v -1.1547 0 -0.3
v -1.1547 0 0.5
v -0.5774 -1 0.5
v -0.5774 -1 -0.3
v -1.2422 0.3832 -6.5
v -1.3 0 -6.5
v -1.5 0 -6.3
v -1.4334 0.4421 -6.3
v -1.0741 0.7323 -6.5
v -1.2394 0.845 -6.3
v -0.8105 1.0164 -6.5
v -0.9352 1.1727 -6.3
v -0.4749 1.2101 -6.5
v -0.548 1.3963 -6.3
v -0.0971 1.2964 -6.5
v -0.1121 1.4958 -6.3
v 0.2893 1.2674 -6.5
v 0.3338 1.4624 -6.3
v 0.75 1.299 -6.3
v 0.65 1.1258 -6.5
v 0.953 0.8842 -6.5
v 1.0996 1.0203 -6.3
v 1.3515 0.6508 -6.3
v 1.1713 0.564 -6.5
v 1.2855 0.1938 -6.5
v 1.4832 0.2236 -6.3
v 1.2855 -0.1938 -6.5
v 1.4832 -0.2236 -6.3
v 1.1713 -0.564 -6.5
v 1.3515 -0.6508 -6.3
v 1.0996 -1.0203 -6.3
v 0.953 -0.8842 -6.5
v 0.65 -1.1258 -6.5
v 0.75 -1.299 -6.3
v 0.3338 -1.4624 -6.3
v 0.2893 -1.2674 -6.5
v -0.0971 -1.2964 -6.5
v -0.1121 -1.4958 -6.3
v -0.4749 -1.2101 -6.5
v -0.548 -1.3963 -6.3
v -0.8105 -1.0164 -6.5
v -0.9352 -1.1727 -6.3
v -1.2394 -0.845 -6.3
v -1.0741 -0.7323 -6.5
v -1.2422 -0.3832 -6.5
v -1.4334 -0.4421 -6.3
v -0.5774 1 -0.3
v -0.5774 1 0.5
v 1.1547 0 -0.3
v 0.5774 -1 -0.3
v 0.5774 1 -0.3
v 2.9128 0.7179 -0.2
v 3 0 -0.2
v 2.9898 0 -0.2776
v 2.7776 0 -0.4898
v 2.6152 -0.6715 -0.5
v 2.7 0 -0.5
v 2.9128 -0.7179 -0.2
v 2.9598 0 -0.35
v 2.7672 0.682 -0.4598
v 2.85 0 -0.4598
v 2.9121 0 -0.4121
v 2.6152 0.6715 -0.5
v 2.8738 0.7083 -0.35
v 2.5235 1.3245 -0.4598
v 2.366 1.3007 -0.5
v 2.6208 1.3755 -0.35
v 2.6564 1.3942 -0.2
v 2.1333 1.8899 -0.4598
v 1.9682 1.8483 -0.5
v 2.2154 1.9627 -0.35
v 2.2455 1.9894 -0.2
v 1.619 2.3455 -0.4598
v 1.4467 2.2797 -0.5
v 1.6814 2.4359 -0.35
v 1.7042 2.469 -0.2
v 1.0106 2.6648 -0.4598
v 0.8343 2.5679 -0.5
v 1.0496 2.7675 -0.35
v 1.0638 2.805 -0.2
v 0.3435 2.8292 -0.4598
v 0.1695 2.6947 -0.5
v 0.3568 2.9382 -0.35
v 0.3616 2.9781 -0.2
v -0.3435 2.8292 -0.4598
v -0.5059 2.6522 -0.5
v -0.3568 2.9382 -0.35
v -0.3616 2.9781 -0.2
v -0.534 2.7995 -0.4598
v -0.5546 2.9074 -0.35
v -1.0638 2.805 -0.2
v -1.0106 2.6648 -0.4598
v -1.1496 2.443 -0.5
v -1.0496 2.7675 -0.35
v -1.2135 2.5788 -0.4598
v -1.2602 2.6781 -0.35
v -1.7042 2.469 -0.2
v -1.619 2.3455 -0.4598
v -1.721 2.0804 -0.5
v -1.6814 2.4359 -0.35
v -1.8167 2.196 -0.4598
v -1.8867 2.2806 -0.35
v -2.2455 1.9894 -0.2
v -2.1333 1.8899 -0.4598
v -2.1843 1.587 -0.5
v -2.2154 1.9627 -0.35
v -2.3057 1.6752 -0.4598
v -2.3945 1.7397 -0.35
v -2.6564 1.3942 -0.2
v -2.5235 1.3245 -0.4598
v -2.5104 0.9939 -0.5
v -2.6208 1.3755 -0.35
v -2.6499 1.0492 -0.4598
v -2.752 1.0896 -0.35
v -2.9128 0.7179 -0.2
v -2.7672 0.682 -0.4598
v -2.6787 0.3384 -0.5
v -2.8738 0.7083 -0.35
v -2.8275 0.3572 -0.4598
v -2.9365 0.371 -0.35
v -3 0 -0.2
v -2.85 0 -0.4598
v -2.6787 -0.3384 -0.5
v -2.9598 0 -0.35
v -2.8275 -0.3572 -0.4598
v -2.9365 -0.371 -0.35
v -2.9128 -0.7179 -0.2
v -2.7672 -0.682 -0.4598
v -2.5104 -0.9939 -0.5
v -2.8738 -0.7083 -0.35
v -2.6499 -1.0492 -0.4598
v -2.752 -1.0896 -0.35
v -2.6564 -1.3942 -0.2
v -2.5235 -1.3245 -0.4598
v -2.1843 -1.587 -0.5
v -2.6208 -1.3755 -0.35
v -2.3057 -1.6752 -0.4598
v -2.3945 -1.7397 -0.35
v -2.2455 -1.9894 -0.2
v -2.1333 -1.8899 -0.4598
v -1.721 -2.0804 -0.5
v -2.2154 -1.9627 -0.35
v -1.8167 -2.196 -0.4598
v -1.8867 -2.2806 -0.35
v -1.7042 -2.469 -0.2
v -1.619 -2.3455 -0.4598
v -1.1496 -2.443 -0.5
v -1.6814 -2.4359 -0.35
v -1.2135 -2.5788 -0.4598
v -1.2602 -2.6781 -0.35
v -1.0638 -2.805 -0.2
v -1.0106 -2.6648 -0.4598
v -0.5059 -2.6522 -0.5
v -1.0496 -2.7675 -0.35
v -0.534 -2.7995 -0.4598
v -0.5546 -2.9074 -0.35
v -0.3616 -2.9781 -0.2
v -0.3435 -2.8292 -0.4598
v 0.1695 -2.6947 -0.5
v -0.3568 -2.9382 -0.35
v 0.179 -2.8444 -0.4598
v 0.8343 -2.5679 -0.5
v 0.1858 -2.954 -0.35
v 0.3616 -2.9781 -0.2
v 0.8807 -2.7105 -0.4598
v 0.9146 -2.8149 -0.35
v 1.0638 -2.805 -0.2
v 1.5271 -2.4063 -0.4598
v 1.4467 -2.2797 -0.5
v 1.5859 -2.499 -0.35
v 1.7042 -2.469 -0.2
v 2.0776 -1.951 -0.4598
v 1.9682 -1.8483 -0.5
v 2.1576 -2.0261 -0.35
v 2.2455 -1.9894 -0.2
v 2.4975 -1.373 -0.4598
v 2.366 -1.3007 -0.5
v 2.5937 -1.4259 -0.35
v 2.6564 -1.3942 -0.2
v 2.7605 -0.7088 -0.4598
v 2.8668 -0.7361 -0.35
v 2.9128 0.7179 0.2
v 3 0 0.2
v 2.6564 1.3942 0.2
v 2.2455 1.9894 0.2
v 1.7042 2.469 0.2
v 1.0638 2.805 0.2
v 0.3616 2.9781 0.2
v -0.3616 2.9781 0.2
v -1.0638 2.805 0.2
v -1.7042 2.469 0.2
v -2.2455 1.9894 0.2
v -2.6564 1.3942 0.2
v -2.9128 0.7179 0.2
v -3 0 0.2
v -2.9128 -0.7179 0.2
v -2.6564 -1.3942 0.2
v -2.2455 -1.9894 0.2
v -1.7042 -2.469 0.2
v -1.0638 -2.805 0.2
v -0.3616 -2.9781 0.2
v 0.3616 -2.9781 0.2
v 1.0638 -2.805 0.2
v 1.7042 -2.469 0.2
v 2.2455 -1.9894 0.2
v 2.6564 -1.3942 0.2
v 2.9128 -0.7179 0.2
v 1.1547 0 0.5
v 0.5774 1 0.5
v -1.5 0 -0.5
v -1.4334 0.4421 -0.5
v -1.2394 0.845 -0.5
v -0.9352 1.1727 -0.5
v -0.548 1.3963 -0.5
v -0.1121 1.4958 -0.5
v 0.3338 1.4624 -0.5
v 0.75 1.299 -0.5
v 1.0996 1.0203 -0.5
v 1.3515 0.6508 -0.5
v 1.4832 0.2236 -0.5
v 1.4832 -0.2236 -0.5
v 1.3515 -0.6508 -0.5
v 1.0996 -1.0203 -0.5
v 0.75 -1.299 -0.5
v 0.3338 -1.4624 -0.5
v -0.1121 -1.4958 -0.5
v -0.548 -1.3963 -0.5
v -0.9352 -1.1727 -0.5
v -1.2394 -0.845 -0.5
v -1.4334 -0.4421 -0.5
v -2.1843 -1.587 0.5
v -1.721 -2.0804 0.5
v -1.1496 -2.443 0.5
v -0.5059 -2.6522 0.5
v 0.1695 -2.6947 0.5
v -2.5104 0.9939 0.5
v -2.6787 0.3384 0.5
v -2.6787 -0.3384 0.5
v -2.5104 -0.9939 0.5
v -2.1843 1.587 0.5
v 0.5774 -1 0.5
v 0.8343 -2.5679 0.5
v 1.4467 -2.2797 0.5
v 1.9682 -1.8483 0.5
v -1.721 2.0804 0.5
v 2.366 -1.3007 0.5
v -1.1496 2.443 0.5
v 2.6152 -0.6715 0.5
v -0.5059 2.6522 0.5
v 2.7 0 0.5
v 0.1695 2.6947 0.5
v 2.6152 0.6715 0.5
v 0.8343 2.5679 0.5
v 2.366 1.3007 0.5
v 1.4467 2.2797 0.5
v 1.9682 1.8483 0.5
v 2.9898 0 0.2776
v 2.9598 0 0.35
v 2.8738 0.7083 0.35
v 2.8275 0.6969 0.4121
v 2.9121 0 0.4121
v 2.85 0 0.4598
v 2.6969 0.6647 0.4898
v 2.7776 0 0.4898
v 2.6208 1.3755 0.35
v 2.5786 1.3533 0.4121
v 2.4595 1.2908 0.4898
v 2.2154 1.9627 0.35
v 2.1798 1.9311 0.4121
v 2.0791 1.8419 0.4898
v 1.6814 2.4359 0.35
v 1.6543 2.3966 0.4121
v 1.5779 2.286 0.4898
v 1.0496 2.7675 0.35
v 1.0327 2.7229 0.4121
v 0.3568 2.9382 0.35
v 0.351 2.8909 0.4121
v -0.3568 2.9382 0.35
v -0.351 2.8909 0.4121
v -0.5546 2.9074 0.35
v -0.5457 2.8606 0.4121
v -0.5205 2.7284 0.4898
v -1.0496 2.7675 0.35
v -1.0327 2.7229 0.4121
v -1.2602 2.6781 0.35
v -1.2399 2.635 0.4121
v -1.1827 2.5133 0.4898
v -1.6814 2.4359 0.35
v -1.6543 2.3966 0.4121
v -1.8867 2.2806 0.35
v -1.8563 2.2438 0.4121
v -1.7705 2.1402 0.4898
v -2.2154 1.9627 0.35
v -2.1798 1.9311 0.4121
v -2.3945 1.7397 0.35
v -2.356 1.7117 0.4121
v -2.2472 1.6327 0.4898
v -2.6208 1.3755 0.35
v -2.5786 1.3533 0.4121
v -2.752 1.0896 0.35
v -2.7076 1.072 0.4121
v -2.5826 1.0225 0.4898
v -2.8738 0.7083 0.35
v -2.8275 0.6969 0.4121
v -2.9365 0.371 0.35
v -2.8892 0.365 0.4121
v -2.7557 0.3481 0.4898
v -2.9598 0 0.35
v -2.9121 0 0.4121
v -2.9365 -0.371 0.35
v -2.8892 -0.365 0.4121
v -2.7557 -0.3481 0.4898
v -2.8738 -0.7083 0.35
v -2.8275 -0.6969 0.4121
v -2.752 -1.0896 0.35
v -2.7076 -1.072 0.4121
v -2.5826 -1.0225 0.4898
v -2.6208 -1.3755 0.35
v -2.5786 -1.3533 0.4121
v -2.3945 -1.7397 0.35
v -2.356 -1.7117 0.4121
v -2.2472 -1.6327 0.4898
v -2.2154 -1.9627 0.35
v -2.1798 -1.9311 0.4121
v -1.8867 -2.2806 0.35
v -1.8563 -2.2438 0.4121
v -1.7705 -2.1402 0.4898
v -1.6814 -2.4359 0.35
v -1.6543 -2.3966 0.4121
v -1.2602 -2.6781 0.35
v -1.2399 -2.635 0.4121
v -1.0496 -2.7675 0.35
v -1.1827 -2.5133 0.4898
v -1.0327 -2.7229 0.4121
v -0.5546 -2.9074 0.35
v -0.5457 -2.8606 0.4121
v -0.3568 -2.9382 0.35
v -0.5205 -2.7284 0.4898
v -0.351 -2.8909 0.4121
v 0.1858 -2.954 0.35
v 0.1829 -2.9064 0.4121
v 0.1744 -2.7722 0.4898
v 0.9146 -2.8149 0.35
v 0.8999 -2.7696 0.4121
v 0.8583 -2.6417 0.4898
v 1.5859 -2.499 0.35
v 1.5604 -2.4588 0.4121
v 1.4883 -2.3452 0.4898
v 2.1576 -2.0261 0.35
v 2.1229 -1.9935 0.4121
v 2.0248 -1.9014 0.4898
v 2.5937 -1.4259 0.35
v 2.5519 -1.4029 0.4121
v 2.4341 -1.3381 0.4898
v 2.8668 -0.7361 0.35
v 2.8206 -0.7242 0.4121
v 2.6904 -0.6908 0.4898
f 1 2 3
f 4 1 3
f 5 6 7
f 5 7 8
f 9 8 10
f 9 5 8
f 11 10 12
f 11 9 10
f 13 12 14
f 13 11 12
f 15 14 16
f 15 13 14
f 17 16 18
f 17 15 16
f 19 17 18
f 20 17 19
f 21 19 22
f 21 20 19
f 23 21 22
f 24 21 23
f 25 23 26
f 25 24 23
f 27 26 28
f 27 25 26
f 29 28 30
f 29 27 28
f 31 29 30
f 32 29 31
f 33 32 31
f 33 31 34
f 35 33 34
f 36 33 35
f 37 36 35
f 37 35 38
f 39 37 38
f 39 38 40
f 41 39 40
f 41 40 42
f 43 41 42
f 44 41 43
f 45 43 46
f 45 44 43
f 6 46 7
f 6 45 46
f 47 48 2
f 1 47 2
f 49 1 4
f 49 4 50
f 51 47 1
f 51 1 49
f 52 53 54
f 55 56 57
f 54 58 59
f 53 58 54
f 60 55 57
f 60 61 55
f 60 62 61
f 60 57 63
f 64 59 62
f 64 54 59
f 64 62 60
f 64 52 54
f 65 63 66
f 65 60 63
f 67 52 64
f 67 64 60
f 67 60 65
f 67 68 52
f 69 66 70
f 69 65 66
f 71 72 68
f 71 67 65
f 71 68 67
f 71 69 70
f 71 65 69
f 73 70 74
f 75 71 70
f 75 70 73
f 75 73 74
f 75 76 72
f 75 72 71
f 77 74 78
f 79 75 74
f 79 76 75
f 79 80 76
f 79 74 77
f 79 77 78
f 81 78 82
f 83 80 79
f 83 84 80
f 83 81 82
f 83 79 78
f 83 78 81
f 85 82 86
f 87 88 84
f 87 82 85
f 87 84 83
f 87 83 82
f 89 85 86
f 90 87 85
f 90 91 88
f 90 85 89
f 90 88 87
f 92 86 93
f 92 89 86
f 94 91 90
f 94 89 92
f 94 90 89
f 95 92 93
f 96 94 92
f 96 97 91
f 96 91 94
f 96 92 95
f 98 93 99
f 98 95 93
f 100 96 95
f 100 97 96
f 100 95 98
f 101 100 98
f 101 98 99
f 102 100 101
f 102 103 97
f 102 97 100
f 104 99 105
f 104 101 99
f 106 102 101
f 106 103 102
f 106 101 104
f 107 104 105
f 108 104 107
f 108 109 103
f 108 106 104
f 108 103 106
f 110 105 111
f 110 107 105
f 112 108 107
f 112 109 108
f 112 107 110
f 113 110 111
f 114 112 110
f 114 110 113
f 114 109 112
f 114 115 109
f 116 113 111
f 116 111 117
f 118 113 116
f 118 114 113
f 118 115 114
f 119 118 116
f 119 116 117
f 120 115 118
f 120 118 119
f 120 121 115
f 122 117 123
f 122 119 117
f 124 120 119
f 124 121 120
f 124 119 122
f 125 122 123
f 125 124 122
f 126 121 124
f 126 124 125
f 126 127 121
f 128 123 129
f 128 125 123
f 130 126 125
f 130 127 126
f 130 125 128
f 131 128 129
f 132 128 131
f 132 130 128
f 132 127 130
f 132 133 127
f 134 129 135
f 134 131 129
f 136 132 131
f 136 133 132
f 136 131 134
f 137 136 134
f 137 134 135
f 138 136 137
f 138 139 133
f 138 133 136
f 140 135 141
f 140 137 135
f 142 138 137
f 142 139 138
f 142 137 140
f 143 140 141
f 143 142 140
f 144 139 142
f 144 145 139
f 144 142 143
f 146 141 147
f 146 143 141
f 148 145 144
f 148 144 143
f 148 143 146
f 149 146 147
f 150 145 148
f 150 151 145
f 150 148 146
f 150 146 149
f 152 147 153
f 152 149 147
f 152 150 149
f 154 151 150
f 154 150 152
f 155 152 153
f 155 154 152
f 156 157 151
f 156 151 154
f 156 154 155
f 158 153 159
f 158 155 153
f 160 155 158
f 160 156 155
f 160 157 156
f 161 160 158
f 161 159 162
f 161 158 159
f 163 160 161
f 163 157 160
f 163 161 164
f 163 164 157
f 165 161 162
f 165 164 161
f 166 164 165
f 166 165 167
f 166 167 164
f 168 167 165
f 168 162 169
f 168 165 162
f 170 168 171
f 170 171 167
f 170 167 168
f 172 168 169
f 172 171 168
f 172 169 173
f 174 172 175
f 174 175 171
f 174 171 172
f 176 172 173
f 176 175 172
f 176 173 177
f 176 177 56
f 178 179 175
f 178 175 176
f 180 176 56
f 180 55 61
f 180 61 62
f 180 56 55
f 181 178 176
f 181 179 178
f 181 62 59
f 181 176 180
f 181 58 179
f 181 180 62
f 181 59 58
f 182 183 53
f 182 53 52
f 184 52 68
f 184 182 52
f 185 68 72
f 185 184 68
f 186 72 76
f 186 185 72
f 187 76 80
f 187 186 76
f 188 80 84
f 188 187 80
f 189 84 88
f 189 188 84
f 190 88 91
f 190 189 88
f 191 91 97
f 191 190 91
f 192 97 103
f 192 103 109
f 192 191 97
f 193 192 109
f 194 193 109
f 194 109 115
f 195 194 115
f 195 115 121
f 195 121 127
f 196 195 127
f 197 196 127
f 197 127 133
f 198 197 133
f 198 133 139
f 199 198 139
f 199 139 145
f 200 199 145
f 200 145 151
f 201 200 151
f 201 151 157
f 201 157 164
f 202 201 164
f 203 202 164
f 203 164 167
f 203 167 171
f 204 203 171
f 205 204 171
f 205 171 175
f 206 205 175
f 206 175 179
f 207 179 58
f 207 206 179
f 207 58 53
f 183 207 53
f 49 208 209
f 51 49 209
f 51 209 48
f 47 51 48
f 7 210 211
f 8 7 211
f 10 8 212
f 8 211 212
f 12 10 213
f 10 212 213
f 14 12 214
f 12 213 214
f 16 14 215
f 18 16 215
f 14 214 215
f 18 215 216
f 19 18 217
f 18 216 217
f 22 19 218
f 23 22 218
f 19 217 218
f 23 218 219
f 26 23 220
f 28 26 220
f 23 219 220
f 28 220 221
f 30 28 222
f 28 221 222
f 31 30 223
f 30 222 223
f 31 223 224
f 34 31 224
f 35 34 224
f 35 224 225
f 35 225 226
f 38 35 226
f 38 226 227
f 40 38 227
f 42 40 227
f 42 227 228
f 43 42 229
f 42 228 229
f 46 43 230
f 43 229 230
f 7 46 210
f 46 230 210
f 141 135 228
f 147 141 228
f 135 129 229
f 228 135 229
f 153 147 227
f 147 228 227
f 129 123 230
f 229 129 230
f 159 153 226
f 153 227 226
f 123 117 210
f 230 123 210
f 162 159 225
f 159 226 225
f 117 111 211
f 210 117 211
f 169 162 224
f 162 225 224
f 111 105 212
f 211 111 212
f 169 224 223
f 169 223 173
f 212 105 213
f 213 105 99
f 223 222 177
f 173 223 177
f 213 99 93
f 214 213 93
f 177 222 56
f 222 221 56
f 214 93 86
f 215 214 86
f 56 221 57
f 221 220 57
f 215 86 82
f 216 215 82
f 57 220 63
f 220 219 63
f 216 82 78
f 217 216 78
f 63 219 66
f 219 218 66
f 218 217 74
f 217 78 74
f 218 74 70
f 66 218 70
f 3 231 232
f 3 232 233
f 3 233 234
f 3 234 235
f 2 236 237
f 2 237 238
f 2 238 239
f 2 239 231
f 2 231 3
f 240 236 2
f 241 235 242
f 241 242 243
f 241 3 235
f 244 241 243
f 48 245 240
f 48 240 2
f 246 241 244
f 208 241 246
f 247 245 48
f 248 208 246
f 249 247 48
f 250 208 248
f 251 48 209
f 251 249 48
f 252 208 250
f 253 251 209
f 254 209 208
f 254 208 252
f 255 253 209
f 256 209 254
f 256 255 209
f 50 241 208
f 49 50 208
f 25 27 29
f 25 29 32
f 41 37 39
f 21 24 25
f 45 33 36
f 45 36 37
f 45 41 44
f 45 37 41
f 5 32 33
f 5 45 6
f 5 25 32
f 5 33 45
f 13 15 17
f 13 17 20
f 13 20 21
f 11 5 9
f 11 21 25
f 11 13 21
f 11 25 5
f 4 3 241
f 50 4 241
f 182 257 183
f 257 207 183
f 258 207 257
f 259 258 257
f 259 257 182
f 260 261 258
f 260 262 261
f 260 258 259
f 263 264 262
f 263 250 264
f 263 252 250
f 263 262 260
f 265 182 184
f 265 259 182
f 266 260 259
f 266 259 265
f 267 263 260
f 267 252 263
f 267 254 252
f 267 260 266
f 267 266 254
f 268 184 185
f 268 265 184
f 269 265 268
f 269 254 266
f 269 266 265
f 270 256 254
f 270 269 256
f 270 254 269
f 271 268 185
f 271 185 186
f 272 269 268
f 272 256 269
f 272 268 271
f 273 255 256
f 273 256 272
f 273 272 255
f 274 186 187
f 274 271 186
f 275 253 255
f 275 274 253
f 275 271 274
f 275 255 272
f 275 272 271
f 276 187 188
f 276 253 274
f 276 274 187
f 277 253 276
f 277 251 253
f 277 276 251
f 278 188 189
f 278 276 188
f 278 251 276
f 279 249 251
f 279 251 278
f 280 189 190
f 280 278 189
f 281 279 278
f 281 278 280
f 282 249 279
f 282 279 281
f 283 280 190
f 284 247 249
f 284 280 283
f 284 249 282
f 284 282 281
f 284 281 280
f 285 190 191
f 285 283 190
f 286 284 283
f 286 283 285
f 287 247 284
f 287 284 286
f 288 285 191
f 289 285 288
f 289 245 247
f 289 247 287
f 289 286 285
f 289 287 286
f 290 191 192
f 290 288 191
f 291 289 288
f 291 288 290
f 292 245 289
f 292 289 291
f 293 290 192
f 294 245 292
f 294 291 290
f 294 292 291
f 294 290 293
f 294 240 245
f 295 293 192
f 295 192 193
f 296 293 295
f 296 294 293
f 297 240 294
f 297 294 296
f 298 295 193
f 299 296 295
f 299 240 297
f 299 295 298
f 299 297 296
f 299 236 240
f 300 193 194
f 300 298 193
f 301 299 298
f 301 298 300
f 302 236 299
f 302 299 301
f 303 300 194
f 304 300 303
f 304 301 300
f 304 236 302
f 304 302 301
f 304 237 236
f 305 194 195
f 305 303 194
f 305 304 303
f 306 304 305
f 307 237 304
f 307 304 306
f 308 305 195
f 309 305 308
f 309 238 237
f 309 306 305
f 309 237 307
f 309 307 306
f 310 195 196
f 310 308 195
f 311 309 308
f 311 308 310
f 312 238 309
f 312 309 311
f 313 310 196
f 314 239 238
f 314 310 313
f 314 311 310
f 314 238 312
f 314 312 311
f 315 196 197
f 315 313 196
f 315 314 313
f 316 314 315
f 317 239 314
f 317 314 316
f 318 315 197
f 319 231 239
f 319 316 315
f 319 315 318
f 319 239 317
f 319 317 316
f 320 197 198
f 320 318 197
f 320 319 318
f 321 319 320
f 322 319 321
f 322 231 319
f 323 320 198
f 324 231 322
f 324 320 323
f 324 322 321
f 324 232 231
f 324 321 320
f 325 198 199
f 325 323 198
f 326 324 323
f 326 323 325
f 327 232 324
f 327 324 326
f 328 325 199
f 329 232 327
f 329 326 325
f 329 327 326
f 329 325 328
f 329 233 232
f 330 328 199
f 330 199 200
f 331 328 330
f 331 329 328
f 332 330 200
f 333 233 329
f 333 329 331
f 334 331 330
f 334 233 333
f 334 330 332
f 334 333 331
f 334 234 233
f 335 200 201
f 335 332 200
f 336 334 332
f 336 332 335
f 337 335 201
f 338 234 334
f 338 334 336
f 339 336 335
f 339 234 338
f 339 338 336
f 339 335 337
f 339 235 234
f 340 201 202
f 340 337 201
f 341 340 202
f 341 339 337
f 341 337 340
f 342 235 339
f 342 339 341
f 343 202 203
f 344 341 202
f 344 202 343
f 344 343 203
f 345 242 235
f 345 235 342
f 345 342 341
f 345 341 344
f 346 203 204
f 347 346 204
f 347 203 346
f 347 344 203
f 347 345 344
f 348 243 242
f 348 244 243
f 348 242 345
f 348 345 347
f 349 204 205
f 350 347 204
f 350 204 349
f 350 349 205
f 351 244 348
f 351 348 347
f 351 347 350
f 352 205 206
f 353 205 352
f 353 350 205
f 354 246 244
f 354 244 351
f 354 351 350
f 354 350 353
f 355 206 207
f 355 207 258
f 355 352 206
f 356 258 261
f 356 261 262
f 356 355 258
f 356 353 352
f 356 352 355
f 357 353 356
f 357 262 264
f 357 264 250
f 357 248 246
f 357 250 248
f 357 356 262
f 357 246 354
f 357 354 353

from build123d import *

# Parameters (mm, degrees)
SKETCH_1_R          = 3
EXTRUDE_1_DEPTH     = 0.5
SKETCH_2_R          = 1.5
EXTRUDE_2_DEPTH     = 6
CHAMFER_1_SIZE      = 0.2
CUT_EXTRUDE_1_DEPTH = 0.8
FILLET_2_R          = 0.3


with BuildPart() as part:
    # 草图1 → 凸台-拉伸1 (new body, symmetric)
    with BuildSketch(Plane.XY):
        Circle(SKETCH_1_R)
    extrude(amount=EXTRUDE_1_DEPTH, both=True)

    # 草图2 → 凸台-拉伸2 (add)
    with BuildSketch(Plane(origin=(0, 0, -0.5), x_dir=(-1, 0, 0), z_dir=(0, 0, -1))):
        Circle(SKETCH_2_R)
    extrude(amount=EXTRUDE_2_DEPTH)

    # 倒角1
    chamfer_1_edges = [part.edges().sort_by_distance(p)[0] for p in [
        (1.5, 0, -6.5),
    ]]
    chamfer(chamfer_1_edges, length=CHAMFER_1_SIZE)

    # 草图3 → 切除-拉伸1 (cut)
    with BuildSketch(Plane.XY.offset(0.5)):
        Polygon((1.154700538, 0), (0.577350269, 1), (-0.577350269, 1), (-1.154700538, 0), (-0.577350269, -1), (0.577350269, -1), align=None)
    extrude(amount=-CUT_EXTRUDE_1_DEPTH, mode=Mode.SUBTRACT)

    # 圆角2
    fillet_2_edges = [part.edges().sort_by_distance(p)[0] for p in [
        (-3, 0, -0.5),
        (-3, 0, 0.5),
    ]]
    fillet(fillet_2_edges, radius=FILLET_2_R)


solid = part.part
